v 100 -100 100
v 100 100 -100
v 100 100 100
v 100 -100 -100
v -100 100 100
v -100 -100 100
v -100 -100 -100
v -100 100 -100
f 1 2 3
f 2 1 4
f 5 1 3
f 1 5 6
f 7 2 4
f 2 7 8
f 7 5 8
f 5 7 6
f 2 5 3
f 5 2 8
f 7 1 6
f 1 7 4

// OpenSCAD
union() {
	color(alpha = 1.0000000000, c = "gray") {
		difference() {
			translate(v = [-100.0000000000, -100.0000000000, -100.0000000000]) {
				cube(center = false, size = [200.0000000000, 200.0000000000, 200.0000000000]);
			}
			translate(v = [0.,0.,5.]) {
				rotate(a = 0.0, v = [-0.0, 0.0, 0]) {
					cylinder(center = true, h = 10.0, r = 5.0000000000);
				}
			}
		}
	}
	color(alpha = 1.0000000000, c = "blue") {
		translate(v = [0.,0.,5.]) {
			rotate(a = 0.0, v = [-0.0, 0.0, 0]) {
				cylinder(center = true, h = 10.0, r = 5.0000000000);
			}
		}
	}
}
